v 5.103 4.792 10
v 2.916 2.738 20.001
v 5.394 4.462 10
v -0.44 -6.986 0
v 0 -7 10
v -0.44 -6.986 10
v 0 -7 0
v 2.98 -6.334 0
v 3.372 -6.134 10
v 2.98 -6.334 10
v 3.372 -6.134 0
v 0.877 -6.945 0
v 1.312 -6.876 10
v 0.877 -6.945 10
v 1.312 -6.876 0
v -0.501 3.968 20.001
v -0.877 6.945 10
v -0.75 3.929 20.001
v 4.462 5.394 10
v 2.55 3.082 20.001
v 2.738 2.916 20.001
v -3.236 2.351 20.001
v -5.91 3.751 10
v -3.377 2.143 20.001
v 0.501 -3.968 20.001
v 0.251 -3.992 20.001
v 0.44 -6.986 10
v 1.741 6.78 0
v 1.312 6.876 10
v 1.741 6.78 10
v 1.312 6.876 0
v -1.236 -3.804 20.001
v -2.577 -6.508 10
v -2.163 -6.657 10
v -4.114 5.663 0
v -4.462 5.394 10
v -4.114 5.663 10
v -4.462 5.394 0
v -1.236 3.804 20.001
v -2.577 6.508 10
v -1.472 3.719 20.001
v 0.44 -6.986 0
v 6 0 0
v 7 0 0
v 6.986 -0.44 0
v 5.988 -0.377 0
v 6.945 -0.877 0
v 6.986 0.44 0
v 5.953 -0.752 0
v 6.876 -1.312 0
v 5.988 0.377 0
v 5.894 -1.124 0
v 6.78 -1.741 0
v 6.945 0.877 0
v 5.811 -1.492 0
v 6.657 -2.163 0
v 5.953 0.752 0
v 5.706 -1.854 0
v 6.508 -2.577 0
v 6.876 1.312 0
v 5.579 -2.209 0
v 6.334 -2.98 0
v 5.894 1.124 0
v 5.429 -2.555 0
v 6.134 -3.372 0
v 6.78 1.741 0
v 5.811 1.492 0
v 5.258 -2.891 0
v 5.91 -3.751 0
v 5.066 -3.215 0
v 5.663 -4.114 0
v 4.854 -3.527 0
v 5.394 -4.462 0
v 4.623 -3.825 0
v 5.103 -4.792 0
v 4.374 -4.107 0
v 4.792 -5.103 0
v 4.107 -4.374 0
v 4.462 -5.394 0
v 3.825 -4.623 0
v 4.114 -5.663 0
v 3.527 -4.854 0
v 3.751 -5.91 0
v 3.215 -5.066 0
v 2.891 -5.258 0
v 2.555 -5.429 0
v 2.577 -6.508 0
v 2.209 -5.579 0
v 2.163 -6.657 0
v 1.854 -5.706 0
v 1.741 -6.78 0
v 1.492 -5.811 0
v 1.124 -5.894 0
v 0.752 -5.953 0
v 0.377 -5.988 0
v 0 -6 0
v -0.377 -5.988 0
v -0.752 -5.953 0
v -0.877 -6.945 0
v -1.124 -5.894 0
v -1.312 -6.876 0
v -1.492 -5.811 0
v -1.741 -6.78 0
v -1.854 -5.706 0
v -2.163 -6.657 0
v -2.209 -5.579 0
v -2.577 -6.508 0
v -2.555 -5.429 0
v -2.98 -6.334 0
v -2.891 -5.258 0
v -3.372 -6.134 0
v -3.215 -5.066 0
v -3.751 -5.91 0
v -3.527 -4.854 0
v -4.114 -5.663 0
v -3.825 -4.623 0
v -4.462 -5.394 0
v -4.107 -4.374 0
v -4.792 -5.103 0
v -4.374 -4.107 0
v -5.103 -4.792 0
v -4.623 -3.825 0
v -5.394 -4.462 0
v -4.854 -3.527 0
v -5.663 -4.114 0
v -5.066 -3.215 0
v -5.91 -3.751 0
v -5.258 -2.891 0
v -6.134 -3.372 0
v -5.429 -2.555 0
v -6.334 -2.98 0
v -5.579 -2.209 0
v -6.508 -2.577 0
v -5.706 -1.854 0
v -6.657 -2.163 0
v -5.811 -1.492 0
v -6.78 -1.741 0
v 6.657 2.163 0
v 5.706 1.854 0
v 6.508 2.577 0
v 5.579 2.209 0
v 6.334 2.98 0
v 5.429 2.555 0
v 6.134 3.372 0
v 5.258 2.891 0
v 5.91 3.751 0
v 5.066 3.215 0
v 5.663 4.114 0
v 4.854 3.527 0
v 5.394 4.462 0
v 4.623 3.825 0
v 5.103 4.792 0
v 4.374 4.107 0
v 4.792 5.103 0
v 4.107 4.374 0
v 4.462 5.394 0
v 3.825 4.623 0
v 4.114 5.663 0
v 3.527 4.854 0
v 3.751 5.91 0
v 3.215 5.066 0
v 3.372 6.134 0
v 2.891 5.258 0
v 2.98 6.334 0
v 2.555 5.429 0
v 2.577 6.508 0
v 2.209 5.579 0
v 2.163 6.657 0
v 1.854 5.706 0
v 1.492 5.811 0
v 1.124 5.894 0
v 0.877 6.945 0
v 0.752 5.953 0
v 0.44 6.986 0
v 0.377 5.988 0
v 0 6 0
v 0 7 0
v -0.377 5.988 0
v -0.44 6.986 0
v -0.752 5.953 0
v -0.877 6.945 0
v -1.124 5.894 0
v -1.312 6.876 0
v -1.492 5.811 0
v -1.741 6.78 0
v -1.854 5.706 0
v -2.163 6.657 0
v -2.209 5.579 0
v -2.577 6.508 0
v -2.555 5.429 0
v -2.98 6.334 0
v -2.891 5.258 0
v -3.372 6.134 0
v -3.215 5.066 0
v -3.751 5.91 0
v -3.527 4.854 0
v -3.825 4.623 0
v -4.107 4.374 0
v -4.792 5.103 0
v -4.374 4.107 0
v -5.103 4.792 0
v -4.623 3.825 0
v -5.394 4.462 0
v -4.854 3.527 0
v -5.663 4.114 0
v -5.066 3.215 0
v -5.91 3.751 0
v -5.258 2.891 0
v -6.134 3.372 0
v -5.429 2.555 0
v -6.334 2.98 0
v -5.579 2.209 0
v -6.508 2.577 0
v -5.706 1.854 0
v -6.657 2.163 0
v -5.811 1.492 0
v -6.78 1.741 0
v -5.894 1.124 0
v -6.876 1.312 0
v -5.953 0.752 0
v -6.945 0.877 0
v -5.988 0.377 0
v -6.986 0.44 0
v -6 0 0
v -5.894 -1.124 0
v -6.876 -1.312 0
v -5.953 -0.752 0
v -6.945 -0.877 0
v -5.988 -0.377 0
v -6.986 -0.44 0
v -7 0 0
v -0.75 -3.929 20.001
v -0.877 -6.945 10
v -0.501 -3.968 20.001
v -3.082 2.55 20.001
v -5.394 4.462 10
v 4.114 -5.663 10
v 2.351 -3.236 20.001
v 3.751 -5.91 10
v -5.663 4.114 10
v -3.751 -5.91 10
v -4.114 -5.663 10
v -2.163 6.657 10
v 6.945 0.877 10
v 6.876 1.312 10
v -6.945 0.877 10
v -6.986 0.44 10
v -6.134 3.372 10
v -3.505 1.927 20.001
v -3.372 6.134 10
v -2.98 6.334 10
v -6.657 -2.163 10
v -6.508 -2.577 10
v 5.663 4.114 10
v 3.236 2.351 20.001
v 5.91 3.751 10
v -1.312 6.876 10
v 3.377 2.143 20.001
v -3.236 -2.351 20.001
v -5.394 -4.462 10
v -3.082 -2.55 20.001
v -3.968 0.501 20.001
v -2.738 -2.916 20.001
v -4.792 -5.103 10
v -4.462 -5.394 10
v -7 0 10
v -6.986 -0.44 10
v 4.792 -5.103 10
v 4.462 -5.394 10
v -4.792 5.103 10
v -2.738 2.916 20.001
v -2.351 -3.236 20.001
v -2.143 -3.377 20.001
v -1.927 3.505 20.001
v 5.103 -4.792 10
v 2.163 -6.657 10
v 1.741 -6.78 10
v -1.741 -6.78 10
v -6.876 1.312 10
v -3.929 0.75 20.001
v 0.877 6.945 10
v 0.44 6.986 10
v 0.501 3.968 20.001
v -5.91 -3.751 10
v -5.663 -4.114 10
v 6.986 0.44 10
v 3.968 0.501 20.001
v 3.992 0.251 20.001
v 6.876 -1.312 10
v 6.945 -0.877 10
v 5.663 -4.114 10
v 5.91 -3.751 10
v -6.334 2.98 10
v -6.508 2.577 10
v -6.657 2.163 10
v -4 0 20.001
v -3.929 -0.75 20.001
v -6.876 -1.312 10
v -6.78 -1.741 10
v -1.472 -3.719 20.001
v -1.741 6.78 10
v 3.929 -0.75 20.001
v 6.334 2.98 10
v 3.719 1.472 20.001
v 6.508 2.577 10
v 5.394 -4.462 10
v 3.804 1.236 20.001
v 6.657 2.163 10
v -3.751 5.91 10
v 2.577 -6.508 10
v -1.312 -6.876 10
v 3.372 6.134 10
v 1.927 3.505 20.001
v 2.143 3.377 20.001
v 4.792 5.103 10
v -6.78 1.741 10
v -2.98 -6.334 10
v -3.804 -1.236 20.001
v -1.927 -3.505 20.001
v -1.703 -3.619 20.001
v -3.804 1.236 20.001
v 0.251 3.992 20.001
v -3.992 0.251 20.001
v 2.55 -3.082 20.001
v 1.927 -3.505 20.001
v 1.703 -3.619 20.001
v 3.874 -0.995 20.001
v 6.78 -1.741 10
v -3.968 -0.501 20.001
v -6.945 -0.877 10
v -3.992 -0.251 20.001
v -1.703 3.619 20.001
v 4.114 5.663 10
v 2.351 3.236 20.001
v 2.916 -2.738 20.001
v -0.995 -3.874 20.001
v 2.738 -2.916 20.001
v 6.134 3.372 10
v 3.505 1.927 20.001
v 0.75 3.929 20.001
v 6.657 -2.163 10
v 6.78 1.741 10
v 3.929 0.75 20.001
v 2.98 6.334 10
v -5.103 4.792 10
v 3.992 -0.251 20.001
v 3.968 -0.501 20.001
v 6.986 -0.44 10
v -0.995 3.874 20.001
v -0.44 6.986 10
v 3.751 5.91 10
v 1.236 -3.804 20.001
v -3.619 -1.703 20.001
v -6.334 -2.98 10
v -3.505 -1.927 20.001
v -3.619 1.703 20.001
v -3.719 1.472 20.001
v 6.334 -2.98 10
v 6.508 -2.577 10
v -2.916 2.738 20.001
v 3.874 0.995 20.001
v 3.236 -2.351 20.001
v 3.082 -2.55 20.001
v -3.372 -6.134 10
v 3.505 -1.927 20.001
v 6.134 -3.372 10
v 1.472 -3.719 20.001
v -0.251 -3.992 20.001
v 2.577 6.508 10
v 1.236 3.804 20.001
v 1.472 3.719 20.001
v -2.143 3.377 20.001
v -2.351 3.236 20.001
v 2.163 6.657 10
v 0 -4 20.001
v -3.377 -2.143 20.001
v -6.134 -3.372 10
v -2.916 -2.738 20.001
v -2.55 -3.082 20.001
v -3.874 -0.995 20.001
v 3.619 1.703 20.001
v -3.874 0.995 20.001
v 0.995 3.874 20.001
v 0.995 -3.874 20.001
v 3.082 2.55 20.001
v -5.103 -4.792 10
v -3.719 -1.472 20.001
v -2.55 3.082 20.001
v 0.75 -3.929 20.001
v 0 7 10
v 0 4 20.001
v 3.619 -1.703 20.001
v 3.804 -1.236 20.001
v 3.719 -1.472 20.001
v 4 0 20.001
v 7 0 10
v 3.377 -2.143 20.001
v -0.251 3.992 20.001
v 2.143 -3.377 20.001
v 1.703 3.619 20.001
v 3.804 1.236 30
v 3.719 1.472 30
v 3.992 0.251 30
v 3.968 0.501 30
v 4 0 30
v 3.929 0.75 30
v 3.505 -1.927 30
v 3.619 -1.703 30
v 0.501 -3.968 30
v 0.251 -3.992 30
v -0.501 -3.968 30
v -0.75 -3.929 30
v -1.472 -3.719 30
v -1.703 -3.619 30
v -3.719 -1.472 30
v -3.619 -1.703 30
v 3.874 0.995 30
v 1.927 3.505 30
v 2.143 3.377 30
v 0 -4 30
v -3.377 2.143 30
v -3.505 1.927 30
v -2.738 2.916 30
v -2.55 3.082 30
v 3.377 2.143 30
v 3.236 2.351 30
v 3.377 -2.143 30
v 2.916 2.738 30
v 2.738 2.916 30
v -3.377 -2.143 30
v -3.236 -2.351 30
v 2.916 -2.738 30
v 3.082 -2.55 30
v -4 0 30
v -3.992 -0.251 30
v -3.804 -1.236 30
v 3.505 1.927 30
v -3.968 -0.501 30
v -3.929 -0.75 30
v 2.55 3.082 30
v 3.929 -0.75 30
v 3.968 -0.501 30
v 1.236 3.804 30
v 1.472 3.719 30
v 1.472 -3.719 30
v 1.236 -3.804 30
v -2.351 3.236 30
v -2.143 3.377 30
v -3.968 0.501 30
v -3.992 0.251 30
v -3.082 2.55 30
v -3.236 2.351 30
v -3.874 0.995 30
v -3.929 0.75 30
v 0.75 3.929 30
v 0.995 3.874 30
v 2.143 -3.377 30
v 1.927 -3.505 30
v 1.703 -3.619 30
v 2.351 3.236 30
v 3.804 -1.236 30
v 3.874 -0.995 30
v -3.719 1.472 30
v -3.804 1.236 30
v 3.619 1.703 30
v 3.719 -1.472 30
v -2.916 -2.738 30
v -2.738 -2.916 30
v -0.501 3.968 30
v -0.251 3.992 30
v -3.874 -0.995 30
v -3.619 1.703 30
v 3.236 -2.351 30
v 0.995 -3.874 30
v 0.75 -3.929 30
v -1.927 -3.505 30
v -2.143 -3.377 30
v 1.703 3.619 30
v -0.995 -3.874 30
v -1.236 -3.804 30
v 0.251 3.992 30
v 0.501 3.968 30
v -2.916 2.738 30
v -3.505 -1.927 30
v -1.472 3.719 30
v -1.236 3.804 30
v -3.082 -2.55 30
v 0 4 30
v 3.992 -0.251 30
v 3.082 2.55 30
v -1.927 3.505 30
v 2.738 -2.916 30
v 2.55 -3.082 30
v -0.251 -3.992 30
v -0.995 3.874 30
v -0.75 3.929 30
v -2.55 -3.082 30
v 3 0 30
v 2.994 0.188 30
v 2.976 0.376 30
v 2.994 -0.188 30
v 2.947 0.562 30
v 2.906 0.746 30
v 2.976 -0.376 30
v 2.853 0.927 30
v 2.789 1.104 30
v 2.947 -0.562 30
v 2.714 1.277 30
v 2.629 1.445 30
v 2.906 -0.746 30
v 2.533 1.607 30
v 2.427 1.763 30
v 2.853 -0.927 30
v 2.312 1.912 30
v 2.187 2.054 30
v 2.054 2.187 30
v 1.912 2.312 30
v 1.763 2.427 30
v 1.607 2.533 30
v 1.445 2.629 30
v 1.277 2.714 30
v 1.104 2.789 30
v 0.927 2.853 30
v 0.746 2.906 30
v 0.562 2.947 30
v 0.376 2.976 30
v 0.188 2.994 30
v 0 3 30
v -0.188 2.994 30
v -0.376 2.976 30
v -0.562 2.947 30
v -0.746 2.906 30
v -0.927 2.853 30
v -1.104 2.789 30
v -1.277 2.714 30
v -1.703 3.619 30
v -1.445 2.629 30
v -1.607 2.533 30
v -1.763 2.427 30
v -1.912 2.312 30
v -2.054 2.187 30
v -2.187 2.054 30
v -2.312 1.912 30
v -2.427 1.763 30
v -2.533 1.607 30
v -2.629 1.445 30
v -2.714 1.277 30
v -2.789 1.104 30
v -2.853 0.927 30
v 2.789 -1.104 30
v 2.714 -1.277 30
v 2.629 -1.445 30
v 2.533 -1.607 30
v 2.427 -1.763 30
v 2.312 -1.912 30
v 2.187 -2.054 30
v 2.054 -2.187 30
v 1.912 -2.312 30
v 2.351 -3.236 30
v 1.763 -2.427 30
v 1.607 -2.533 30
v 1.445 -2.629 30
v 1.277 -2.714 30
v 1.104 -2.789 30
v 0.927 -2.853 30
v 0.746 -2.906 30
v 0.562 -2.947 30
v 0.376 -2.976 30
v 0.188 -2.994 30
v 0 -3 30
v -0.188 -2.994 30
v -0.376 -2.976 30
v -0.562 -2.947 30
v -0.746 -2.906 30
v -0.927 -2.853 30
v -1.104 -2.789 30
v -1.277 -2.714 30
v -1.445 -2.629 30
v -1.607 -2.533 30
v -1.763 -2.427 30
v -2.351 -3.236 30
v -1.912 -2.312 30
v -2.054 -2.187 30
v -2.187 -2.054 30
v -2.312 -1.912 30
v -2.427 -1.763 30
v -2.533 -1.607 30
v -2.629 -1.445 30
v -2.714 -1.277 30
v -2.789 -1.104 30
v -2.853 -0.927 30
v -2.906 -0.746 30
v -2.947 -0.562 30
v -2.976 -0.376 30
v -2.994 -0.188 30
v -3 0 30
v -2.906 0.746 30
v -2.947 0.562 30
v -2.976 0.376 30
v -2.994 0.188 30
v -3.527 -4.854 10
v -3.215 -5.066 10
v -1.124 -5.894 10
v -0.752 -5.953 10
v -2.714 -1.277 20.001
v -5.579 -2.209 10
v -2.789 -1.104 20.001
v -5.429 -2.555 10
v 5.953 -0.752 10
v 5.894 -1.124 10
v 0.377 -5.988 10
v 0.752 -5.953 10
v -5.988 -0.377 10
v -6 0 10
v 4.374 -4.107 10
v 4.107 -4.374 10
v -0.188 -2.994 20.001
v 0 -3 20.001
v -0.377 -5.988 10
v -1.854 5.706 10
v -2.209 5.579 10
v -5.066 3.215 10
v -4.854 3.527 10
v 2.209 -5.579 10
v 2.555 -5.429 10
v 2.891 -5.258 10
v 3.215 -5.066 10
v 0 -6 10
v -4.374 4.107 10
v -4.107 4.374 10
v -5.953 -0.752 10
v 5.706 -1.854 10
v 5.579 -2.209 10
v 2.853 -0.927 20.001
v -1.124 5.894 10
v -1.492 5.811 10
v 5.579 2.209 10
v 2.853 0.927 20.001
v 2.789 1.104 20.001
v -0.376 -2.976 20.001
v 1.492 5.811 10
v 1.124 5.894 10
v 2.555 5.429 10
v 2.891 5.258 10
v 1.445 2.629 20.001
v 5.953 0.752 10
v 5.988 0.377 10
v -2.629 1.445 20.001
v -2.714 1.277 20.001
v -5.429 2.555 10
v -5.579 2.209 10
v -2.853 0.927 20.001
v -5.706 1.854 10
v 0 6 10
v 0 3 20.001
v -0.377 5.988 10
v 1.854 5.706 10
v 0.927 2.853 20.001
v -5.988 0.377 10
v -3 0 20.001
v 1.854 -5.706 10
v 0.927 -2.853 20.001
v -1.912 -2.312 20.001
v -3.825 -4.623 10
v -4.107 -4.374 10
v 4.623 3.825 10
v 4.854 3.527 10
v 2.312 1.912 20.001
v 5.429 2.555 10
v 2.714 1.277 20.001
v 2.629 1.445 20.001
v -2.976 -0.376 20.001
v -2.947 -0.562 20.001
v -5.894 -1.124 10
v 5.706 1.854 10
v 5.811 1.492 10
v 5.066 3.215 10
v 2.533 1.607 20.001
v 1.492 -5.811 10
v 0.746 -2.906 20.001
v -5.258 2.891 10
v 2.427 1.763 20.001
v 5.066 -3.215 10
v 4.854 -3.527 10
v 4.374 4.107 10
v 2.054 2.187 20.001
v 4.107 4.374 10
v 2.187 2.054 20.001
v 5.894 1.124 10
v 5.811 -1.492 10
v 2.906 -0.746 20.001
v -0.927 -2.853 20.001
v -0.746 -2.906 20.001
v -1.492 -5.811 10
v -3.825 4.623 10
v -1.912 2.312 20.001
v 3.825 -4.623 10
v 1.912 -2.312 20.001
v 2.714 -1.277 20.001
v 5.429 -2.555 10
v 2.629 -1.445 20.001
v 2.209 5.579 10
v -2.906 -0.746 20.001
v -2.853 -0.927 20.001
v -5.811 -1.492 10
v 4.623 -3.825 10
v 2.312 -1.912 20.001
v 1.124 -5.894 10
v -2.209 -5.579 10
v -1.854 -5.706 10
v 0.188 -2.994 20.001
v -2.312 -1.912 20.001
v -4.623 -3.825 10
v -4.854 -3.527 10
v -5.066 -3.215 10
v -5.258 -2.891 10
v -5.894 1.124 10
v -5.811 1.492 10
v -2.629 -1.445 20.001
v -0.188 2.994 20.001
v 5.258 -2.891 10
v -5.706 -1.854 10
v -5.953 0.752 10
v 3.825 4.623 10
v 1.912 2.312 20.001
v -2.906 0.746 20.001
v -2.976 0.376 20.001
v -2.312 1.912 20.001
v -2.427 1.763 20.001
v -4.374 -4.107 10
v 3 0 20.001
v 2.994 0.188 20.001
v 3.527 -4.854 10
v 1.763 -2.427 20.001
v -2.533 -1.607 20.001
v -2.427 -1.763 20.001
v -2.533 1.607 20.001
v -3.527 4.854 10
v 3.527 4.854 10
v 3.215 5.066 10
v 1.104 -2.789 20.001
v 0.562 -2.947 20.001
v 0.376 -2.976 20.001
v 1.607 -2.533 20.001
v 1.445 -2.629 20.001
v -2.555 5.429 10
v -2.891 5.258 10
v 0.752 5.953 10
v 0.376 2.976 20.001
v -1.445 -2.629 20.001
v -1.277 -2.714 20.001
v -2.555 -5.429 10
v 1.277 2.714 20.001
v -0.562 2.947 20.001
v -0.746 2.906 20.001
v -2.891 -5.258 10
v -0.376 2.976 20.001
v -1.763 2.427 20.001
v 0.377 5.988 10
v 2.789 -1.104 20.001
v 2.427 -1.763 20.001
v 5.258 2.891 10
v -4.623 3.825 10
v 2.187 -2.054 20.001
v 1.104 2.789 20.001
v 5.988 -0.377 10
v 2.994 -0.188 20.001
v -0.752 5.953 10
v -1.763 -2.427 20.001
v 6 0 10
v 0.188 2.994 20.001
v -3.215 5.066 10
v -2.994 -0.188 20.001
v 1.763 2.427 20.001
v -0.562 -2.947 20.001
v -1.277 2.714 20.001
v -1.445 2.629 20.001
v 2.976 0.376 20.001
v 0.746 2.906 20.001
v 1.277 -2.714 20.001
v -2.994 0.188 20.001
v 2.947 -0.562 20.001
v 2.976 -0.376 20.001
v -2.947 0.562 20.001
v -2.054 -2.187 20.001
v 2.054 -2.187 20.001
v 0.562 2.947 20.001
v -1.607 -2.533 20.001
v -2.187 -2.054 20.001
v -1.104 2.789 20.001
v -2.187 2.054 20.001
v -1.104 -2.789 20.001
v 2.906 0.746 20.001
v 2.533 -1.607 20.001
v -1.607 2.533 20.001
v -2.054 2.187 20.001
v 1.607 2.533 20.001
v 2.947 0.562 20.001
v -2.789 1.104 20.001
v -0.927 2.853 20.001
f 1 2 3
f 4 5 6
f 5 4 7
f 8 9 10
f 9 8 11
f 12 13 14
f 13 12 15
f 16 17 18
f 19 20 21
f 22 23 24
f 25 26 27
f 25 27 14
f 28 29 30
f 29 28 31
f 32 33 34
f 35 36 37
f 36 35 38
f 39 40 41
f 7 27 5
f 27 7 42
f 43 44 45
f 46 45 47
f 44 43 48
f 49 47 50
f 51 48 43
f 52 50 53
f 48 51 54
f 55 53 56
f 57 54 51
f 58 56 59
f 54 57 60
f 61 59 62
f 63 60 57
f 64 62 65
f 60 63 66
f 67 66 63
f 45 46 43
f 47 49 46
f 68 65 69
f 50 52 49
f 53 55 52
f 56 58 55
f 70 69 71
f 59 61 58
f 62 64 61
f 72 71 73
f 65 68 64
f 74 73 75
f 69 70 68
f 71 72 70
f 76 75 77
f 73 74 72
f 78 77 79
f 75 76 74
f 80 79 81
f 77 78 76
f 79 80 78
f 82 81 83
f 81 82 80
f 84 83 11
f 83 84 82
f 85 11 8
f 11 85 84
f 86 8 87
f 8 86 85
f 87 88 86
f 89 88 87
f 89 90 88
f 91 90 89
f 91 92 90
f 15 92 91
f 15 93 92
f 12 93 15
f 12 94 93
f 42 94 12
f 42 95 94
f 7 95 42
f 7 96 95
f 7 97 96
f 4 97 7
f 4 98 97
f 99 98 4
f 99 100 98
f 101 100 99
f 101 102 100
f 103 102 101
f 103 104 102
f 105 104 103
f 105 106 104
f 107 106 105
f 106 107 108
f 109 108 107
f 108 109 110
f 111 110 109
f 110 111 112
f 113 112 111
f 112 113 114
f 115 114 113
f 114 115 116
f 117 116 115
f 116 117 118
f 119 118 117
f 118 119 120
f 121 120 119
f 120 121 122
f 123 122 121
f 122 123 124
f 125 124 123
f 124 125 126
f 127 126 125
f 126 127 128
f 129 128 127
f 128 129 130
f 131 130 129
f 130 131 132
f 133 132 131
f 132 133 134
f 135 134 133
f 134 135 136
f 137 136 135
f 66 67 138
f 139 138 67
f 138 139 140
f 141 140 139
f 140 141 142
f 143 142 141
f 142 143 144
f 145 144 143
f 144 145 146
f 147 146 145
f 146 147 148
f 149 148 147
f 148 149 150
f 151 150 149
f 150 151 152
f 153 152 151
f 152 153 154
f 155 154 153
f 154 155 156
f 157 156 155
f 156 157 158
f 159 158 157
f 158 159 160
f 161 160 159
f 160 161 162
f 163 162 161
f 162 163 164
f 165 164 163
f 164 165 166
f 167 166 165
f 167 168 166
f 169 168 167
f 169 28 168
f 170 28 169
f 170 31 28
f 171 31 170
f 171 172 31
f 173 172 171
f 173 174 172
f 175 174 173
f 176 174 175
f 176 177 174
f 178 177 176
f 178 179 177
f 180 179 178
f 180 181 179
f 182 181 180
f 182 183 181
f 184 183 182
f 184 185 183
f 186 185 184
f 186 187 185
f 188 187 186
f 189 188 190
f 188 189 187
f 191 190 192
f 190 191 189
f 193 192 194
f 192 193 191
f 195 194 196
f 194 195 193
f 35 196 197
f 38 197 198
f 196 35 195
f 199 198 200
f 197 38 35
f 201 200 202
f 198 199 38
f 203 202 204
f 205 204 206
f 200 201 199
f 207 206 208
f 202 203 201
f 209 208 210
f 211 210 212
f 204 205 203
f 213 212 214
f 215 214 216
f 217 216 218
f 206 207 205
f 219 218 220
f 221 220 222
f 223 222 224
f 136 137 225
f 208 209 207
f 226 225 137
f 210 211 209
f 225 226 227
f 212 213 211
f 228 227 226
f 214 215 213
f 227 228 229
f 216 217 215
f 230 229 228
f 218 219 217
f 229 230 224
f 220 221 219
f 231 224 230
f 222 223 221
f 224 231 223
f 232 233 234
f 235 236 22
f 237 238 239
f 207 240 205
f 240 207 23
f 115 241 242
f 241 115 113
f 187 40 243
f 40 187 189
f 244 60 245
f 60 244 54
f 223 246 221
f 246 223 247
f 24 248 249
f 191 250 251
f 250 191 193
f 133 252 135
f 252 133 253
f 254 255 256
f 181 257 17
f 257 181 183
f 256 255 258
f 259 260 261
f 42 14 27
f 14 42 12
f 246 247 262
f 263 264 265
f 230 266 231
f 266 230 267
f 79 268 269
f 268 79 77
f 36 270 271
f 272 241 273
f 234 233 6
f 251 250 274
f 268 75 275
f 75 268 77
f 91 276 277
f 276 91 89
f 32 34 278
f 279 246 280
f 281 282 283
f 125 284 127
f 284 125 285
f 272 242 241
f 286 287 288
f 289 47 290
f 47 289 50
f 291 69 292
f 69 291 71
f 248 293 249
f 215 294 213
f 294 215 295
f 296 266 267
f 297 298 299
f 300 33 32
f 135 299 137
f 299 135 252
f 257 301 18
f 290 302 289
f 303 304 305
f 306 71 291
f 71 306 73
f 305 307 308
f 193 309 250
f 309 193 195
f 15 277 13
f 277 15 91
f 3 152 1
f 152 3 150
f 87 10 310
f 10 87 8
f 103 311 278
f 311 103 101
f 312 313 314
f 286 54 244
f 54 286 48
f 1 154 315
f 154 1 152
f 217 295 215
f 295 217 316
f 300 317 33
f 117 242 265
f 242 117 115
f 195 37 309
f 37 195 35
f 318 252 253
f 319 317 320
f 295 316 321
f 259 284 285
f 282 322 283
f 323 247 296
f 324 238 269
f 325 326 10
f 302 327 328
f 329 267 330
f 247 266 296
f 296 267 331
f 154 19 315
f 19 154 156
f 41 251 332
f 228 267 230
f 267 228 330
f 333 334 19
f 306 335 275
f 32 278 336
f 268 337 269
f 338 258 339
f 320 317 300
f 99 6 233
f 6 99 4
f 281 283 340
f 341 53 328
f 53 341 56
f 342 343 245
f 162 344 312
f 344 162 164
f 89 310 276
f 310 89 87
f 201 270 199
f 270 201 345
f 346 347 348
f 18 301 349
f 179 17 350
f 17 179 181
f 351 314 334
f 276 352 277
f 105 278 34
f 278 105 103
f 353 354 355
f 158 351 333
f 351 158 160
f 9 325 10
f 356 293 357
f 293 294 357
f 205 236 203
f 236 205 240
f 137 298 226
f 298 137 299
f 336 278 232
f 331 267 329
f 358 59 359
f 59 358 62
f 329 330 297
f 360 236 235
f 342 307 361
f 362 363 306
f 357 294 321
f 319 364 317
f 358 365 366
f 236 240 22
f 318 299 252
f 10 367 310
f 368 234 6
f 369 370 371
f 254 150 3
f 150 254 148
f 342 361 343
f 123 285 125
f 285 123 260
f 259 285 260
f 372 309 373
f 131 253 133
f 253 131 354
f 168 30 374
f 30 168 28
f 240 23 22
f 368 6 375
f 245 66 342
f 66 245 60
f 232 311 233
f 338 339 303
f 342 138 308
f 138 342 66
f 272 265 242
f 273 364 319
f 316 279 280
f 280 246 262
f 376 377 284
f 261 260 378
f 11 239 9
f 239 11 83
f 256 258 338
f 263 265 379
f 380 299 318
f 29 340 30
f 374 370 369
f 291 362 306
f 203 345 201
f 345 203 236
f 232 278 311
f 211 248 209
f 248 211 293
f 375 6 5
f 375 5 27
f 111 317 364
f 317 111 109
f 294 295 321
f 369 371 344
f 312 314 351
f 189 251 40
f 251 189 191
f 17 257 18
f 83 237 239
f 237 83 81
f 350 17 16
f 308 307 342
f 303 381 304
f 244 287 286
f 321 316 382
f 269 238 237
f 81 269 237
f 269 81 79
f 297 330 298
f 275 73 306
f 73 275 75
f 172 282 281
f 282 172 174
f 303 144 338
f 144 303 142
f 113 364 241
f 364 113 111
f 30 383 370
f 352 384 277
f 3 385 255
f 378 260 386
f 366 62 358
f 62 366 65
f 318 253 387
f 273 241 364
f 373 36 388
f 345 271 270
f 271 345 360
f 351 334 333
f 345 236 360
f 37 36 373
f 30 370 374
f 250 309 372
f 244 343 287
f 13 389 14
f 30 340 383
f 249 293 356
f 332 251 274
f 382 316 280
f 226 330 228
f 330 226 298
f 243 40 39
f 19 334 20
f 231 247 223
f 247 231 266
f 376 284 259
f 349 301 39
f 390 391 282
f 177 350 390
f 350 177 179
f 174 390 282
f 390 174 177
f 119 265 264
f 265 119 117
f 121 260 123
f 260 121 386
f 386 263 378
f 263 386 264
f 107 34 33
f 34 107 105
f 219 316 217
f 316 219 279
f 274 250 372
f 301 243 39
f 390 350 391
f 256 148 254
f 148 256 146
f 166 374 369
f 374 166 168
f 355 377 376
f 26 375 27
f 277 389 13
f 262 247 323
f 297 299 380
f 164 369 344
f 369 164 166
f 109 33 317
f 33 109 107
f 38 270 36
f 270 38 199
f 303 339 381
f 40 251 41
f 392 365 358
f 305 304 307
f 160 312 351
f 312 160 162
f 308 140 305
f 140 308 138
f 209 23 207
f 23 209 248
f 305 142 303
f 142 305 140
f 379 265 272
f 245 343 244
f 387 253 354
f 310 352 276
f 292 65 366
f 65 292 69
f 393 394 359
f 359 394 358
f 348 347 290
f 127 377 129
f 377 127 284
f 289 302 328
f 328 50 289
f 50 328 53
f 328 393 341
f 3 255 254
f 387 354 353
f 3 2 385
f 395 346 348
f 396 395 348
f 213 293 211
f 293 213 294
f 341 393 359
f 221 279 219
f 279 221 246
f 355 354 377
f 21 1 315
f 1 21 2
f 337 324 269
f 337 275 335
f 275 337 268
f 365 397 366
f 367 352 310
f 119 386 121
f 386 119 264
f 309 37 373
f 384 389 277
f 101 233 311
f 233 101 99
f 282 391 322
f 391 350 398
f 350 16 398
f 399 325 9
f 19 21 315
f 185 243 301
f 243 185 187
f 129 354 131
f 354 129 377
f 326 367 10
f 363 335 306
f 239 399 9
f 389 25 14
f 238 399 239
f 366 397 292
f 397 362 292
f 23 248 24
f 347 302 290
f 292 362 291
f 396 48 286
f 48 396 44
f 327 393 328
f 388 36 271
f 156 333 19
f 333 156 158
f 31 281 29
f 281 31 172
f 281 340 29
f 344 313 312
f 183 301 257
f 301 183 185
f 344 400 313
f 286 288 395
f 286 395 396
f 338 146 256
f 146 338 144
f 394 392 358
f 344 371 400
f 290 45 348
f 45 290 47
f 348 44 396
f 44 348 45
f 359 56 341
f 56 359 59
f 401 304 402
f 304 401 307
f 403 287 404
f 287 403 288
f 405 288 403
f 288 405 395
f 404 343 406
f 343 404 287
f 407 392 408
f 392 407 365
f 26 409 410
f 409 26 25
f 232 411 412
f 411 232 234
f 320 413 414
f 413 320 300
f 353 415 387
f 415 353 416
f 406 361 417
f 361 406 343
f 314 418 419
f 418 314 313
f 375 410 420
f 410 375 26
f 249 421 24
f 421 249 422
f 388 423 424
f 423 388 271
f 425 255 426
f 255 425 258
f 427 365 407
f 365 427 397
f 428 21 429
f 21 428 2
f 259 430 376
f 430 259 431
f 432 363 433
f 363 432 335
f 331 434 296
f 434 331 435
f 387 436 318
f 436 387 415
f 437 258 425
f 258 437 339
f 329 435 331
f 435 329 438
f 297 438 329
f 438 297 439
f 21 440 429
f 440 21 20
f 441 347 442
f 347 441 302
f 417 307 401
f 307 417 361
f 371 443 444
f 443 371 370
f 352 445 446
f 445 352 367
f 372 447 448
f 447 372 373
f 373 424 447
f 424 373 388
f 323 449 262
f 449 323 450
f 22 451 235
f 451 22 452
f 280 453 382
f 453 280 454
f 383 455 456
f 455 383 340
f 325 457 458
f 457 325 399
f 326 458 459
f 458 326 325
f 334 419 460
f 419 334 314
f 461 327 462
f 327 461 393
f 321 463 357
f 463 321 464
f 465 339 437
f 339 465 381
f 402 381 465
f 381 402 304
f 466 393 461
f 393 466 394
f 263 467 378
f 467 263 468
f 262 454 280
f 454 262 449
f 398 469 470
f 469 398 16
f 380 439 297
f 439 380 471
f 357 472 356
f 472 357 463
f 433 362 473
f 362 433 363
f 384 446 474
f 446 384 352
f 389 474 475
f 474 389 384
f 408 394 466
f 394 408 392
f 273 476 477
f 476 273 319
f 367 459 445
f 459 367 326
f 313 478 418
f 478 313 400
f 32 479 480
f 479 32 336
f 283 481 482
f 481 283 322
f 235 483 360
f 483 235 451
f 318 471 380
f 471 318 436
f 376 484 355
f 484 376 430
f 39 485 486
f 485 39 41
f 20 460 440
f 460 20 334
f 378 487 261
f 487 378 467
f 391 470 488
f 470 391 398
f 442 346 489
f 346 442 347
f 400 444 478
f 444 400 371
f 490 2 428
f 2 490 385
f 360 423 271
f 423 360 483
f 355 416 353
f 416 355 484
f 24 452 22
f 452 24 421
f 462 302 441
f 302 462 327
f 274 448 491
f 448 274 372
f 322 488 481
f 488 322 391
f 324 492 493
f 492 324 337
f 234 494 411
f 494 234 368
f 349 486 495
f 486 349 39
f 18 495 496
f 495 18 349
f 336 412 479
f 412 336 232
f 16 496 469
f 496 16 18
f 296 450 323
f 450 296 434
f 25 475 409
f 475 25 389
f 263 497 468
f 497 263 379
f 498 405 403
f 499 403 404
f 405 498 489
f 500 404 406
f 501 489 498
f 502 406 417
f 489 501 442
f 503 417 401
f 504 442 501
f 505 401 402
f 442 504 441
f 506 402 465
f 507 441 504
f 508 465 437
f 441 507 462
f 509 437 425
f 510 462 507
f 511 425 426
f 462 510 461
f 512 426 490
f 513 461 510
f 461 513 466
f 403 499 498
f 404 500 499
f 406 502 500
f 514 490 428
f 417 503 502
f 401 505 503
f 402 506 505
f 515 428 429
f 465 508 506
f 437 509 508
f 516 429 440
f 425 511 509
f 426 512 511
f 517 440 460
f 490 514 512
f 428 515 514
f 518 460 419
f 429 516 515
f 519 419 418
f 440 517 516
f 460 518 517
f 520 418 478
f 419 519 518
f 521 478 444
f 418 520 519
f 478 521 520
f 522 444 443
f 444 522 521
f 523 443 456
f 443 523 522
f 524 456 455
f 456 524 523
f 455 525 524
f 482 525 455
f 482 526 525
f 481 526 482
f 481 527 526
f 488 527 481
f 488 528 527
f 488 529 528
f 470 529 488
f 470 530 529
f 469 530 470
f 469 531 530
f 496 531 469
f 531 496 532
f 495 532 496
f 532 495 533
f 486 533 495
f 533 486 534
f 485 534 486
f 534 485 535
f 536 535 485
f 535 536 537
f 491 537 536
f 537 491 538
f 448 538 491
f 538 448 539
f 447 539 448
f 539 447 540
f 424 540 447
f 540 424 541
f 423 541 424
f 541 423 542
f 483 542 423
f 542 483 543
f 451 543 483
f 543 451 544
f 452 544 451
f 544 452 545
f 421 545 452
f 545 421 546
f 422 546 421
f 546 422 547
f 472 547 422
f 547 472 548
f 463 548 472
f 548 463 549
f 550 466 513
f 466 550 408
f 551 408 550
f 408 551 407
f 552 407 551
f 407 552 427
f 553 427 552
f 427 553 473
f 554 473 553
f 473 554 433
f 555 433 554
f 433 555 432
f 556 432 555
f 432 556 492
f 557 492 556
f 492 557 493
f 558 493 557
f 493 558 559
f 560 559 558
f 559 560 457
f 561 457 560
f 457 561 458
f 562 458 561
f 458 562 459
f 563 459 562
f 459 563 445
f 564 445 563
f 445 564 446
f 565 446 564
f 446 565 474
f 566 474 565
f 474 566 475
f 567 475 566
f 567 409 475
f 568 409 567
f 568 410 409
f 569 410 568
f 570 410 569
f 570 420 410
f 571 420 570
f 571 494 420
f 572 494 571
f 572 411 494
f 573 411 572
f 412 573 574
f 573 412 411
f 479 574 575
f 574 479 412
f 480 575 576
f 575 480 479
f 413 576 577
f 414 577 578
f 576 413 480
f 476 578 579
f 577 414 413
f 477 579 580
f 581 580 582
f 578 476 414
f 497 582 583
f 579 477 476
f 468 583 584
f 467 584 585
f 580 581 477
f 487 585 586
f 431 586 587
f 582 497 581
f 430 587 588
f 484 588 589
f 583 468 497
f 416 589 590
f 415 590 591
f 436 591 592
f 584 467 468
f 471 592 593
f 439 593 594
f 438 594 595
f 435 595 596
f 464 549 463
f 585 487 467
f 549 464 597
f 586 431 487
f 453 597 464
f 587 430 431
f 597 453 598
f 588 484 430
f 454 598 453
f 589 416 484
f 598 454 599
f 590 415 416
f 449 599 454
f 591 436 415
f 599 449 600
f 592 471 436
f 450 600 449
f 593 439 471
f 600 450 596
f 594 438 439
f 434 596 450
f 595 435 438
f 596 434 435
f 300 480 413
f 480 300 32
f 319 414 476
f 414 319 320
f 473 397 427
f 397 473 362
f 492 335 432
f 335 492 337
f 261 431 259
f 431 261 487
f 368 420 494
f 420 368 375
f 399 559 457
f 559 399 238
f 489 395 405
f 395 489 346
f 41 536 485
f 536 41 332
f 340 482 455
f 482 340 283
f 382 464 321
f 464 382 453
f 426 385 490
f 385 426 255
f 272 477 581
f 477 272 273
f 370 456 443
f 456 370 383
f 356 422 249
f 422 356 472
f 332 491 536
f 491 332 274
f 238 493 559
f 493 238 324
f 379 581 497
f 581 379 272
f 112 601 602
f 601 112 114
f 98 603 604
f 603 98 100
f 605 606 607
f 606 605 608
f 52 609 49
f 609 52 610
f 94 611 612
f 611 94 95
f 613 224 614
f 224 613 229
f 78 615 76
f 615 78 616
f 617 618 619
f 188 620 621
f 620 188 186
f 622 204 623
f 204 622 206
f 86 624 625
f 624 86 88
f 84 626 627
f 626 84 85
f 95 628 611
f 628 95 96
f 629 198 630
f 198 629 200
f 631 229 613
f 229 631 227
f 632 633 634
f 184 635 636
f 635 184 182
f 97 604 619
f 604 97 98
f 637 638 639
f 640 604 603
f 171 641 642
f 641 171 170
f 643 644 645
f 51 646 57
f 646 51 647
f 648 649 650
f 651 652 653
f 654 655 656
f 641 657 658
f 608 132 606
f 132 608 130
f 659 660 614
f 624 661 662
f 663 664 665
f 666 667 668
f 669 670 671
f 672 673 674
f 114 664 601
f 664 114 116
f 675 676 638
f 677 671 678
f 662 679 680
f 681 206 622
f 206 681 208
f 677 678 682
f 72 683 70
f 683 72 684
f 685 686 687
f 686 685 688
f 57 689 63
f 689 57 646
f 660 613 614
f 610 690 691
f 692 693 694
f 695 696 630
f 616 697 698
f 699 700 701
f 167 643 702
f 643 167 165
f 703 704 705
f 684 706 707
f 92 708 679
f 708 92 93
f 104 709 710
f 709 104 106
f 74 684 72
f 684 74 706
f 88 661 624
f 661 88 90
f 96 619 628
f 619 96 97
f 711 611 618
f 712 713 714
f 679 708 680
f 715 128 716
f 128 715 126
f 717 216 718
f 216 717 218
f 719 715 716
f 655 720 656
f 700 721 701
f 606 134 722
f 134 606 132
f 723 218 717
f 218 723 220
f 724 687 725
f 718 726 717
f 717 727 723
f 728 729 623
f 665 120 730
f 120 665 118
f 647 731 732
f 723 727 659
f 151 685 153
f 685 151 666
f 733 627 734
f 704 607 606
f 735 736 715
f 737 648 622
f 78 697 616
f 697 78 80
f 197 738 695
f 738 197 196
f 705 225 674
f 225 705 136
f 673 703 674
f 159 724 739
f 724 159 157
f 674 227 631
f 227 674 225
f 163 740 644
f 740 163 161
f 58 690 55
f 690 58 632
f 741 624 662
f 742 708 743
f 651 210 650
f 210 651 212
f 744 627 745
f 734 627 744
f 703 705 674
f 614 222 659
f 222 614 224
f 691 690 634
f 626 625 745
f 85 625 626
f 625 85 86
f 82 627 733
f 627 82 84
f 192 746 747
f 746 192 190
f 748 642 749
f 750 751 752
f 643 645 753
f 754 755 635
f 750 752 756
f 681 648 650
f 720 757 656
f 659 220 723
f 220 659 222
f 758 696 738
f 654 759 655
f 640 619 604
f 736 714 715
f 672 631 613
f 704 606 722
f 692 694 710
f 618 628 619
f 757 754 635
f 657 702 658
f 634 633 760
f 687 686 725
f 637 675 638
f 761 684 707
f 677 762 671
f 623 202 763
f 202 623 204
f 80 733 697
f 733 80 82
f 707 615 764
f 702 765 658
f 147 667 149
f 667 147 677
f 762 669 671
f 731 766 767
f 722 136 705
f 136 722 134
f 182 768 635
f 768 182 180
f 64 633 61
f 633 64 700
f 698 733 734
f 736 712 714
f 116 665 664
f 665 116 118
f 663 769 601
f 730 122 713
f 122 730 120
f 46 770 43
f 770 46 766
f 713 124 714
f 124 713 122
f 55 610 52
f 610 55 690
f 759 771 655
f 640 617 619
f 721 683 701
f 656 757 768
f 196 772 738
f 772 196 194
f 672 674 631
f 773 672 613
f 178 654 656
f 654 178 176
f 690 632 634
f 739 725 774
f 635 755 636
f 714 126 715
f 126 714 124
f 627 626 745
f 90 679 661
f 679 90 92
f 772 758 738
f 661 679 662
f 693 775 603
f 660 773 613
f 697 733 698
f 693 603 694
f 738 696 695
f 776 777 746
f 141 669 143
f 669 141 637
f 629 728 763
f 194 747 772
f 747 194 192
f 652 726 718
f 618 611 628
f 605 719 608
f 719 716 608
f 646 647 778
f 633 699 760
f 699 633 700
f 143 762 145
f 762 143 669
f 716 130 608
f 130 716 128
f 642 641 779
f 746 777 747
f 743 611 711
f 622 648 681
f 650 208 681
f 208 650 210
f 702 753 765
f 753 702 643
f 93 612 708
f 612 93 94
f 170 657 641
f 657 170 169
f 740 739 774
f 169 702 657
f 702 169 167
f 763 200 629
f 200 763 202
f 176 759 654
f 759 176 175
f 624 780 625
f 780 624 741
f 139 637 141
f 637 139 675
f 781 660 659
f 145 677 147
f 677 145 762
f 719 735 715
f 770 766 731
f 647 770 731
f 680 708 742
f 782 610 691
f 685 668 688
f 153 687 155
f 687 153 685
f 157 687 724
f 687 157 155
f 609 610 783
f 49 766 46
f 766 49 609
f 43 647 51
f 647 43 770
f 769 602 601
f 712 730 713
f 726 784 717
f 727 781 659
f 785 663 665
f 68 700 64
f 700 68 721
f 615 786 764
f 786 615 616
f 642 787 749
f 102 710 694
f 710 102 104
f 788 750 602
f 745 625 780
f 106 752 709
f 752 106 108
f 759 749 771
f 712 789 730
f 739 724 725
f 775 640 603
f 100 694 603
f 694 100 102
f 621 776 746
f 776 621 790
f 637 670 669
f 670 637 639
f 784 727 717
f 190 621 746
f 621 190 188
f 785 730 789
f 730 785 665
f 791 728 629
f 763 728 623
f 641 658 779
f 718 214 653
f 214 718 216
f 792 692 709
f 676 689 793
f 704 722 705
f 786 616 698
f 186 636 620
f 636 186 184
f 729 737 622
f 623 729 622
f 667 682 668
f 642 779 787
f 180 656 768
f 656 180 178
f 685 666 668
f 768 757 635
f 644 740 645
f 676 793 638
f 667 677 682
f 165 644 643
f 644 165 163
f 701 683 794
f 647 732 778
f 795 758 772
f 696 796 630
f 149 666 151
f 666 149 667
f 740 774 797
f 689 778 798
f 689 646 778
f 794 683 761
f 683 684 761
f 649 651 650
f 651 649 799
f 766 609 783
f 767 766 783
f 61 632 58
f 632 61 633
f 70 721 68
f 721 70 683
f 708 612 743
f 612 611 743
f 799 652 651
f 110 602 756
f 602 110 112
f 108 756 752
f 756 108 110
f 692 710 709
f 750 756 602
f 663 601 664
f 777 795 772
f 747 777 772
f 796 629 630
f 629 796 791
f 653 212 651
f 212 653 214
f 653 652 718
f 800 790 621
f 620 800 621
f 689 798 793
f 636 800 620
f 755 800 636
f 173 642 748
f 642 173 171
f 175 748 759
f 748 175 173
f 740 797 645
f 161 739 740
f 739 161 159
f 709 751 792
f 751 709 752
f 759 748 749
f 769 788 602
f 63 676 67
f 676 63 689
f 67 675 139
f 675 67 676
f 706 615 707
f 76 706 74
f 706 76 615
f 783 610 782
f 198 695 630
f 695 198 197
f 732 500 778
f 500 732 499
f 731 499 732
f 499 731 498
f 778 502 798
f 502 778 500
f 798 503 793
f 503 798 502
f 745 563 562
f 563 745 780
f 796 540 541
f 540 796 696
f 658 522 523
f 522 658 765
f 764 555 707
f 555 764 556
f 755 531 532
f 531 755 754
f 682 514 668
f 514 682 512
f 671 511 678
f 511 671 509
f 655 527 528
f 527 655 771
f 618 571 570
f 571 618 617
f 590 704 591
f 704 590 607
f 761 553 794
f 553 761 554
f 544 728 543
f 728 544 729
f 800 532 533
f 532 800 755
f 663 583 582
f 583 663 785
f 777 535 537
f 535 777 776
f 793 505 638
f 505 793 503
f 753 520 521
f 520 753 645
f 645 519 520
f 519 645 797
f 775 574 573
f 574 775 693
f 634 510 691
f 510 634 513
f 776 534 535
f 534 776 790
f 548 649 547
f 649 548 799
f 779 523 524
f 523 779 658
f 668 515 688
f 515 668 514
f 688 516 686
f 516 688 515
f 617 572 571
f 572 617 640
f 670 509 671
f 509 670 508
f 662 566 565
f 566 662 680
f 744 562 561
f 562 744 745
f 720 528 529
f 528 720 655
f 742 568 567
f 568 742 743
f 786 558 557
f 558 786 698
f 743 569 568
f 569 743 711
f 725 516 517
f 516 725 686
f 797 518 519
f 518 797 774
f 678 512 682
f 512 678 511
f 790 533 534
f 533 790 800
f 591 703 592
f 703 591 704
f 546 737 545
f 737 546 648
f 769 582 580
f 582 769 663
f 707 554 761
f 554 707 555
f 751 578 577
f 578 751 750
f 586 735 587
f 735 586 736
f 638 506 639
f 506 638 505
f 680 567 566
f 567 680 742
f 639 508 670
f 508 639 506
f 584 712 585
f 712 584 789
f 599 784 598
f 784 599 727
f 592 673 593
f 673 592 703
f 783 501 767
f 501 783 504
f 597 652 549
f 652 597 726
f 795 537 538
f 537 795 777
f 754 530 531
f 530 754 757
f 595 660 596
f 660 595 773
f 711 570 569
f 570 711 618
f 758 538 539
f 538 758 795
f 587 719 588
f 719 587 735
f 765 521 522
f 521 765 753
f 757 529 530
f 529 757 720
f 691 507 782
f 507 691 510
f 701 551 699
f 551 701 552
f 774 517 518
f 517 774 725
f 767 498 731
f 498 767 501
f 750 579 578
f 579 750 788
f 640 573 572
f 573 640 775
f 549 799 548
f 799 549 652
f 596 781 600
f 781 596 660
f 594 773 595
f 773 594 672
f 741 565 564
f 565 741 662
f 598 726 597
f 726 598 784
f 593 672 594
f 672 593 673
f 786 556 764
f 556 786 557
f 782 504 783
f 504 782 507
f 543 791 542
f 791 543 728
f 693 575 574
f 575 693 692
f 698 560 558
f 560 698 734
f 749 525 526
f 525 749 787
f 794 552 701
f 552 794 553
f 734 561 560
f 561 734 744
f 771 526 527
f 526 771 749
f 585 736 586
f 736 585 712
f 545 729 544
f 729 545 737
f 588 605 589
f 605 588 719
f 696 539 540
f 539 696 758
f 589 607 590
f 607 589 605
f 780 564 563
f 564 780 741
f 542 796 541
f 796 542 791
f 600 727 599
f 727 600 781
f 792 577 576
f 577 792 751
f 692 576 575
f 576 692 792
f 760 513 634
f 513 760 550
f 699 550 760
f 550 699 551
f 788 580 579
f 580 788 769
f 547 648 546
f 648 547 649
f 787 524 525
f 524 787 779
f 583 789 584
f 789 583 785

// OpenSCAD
$fn = 100;
epsilon = 1;

intakeInnerD = 12;
intakeOuterD = 14;
intakeHeight = 10;

transitionHeight = 10;

outputOuterD = 8;
outputInnerD = 6;
outputHeight = 10;

module convertor(smallD, smallHeight, bigD, bigHeight, transitionHeight) {
    hull() {

        cylinder(h=bigHeight, d=bigD);

        translate([
            0,
            0,
            bigHeight + transitionHeight
        ])
        cylinder(h=0.001, d=smallD);
    }

    translate([
        0,
        0,
        bigHeight + transitionHeight
    ])
    cylinder(h=smallHeight, d=smallD);
}


difference() {
    convertor(
        outputOuterD,
        outputHeight,
        intakeOuterD,
        intakeHeight,
        transitionHeight
    );

    translate([
        0,
        0,
        -epsilon
    ])
    convertor(
        outputInnerD,
        outputHeight + epsilon,
        intakeInnerD,
        intakeHeight + epsilon,
        transitionHeight
    );
}
